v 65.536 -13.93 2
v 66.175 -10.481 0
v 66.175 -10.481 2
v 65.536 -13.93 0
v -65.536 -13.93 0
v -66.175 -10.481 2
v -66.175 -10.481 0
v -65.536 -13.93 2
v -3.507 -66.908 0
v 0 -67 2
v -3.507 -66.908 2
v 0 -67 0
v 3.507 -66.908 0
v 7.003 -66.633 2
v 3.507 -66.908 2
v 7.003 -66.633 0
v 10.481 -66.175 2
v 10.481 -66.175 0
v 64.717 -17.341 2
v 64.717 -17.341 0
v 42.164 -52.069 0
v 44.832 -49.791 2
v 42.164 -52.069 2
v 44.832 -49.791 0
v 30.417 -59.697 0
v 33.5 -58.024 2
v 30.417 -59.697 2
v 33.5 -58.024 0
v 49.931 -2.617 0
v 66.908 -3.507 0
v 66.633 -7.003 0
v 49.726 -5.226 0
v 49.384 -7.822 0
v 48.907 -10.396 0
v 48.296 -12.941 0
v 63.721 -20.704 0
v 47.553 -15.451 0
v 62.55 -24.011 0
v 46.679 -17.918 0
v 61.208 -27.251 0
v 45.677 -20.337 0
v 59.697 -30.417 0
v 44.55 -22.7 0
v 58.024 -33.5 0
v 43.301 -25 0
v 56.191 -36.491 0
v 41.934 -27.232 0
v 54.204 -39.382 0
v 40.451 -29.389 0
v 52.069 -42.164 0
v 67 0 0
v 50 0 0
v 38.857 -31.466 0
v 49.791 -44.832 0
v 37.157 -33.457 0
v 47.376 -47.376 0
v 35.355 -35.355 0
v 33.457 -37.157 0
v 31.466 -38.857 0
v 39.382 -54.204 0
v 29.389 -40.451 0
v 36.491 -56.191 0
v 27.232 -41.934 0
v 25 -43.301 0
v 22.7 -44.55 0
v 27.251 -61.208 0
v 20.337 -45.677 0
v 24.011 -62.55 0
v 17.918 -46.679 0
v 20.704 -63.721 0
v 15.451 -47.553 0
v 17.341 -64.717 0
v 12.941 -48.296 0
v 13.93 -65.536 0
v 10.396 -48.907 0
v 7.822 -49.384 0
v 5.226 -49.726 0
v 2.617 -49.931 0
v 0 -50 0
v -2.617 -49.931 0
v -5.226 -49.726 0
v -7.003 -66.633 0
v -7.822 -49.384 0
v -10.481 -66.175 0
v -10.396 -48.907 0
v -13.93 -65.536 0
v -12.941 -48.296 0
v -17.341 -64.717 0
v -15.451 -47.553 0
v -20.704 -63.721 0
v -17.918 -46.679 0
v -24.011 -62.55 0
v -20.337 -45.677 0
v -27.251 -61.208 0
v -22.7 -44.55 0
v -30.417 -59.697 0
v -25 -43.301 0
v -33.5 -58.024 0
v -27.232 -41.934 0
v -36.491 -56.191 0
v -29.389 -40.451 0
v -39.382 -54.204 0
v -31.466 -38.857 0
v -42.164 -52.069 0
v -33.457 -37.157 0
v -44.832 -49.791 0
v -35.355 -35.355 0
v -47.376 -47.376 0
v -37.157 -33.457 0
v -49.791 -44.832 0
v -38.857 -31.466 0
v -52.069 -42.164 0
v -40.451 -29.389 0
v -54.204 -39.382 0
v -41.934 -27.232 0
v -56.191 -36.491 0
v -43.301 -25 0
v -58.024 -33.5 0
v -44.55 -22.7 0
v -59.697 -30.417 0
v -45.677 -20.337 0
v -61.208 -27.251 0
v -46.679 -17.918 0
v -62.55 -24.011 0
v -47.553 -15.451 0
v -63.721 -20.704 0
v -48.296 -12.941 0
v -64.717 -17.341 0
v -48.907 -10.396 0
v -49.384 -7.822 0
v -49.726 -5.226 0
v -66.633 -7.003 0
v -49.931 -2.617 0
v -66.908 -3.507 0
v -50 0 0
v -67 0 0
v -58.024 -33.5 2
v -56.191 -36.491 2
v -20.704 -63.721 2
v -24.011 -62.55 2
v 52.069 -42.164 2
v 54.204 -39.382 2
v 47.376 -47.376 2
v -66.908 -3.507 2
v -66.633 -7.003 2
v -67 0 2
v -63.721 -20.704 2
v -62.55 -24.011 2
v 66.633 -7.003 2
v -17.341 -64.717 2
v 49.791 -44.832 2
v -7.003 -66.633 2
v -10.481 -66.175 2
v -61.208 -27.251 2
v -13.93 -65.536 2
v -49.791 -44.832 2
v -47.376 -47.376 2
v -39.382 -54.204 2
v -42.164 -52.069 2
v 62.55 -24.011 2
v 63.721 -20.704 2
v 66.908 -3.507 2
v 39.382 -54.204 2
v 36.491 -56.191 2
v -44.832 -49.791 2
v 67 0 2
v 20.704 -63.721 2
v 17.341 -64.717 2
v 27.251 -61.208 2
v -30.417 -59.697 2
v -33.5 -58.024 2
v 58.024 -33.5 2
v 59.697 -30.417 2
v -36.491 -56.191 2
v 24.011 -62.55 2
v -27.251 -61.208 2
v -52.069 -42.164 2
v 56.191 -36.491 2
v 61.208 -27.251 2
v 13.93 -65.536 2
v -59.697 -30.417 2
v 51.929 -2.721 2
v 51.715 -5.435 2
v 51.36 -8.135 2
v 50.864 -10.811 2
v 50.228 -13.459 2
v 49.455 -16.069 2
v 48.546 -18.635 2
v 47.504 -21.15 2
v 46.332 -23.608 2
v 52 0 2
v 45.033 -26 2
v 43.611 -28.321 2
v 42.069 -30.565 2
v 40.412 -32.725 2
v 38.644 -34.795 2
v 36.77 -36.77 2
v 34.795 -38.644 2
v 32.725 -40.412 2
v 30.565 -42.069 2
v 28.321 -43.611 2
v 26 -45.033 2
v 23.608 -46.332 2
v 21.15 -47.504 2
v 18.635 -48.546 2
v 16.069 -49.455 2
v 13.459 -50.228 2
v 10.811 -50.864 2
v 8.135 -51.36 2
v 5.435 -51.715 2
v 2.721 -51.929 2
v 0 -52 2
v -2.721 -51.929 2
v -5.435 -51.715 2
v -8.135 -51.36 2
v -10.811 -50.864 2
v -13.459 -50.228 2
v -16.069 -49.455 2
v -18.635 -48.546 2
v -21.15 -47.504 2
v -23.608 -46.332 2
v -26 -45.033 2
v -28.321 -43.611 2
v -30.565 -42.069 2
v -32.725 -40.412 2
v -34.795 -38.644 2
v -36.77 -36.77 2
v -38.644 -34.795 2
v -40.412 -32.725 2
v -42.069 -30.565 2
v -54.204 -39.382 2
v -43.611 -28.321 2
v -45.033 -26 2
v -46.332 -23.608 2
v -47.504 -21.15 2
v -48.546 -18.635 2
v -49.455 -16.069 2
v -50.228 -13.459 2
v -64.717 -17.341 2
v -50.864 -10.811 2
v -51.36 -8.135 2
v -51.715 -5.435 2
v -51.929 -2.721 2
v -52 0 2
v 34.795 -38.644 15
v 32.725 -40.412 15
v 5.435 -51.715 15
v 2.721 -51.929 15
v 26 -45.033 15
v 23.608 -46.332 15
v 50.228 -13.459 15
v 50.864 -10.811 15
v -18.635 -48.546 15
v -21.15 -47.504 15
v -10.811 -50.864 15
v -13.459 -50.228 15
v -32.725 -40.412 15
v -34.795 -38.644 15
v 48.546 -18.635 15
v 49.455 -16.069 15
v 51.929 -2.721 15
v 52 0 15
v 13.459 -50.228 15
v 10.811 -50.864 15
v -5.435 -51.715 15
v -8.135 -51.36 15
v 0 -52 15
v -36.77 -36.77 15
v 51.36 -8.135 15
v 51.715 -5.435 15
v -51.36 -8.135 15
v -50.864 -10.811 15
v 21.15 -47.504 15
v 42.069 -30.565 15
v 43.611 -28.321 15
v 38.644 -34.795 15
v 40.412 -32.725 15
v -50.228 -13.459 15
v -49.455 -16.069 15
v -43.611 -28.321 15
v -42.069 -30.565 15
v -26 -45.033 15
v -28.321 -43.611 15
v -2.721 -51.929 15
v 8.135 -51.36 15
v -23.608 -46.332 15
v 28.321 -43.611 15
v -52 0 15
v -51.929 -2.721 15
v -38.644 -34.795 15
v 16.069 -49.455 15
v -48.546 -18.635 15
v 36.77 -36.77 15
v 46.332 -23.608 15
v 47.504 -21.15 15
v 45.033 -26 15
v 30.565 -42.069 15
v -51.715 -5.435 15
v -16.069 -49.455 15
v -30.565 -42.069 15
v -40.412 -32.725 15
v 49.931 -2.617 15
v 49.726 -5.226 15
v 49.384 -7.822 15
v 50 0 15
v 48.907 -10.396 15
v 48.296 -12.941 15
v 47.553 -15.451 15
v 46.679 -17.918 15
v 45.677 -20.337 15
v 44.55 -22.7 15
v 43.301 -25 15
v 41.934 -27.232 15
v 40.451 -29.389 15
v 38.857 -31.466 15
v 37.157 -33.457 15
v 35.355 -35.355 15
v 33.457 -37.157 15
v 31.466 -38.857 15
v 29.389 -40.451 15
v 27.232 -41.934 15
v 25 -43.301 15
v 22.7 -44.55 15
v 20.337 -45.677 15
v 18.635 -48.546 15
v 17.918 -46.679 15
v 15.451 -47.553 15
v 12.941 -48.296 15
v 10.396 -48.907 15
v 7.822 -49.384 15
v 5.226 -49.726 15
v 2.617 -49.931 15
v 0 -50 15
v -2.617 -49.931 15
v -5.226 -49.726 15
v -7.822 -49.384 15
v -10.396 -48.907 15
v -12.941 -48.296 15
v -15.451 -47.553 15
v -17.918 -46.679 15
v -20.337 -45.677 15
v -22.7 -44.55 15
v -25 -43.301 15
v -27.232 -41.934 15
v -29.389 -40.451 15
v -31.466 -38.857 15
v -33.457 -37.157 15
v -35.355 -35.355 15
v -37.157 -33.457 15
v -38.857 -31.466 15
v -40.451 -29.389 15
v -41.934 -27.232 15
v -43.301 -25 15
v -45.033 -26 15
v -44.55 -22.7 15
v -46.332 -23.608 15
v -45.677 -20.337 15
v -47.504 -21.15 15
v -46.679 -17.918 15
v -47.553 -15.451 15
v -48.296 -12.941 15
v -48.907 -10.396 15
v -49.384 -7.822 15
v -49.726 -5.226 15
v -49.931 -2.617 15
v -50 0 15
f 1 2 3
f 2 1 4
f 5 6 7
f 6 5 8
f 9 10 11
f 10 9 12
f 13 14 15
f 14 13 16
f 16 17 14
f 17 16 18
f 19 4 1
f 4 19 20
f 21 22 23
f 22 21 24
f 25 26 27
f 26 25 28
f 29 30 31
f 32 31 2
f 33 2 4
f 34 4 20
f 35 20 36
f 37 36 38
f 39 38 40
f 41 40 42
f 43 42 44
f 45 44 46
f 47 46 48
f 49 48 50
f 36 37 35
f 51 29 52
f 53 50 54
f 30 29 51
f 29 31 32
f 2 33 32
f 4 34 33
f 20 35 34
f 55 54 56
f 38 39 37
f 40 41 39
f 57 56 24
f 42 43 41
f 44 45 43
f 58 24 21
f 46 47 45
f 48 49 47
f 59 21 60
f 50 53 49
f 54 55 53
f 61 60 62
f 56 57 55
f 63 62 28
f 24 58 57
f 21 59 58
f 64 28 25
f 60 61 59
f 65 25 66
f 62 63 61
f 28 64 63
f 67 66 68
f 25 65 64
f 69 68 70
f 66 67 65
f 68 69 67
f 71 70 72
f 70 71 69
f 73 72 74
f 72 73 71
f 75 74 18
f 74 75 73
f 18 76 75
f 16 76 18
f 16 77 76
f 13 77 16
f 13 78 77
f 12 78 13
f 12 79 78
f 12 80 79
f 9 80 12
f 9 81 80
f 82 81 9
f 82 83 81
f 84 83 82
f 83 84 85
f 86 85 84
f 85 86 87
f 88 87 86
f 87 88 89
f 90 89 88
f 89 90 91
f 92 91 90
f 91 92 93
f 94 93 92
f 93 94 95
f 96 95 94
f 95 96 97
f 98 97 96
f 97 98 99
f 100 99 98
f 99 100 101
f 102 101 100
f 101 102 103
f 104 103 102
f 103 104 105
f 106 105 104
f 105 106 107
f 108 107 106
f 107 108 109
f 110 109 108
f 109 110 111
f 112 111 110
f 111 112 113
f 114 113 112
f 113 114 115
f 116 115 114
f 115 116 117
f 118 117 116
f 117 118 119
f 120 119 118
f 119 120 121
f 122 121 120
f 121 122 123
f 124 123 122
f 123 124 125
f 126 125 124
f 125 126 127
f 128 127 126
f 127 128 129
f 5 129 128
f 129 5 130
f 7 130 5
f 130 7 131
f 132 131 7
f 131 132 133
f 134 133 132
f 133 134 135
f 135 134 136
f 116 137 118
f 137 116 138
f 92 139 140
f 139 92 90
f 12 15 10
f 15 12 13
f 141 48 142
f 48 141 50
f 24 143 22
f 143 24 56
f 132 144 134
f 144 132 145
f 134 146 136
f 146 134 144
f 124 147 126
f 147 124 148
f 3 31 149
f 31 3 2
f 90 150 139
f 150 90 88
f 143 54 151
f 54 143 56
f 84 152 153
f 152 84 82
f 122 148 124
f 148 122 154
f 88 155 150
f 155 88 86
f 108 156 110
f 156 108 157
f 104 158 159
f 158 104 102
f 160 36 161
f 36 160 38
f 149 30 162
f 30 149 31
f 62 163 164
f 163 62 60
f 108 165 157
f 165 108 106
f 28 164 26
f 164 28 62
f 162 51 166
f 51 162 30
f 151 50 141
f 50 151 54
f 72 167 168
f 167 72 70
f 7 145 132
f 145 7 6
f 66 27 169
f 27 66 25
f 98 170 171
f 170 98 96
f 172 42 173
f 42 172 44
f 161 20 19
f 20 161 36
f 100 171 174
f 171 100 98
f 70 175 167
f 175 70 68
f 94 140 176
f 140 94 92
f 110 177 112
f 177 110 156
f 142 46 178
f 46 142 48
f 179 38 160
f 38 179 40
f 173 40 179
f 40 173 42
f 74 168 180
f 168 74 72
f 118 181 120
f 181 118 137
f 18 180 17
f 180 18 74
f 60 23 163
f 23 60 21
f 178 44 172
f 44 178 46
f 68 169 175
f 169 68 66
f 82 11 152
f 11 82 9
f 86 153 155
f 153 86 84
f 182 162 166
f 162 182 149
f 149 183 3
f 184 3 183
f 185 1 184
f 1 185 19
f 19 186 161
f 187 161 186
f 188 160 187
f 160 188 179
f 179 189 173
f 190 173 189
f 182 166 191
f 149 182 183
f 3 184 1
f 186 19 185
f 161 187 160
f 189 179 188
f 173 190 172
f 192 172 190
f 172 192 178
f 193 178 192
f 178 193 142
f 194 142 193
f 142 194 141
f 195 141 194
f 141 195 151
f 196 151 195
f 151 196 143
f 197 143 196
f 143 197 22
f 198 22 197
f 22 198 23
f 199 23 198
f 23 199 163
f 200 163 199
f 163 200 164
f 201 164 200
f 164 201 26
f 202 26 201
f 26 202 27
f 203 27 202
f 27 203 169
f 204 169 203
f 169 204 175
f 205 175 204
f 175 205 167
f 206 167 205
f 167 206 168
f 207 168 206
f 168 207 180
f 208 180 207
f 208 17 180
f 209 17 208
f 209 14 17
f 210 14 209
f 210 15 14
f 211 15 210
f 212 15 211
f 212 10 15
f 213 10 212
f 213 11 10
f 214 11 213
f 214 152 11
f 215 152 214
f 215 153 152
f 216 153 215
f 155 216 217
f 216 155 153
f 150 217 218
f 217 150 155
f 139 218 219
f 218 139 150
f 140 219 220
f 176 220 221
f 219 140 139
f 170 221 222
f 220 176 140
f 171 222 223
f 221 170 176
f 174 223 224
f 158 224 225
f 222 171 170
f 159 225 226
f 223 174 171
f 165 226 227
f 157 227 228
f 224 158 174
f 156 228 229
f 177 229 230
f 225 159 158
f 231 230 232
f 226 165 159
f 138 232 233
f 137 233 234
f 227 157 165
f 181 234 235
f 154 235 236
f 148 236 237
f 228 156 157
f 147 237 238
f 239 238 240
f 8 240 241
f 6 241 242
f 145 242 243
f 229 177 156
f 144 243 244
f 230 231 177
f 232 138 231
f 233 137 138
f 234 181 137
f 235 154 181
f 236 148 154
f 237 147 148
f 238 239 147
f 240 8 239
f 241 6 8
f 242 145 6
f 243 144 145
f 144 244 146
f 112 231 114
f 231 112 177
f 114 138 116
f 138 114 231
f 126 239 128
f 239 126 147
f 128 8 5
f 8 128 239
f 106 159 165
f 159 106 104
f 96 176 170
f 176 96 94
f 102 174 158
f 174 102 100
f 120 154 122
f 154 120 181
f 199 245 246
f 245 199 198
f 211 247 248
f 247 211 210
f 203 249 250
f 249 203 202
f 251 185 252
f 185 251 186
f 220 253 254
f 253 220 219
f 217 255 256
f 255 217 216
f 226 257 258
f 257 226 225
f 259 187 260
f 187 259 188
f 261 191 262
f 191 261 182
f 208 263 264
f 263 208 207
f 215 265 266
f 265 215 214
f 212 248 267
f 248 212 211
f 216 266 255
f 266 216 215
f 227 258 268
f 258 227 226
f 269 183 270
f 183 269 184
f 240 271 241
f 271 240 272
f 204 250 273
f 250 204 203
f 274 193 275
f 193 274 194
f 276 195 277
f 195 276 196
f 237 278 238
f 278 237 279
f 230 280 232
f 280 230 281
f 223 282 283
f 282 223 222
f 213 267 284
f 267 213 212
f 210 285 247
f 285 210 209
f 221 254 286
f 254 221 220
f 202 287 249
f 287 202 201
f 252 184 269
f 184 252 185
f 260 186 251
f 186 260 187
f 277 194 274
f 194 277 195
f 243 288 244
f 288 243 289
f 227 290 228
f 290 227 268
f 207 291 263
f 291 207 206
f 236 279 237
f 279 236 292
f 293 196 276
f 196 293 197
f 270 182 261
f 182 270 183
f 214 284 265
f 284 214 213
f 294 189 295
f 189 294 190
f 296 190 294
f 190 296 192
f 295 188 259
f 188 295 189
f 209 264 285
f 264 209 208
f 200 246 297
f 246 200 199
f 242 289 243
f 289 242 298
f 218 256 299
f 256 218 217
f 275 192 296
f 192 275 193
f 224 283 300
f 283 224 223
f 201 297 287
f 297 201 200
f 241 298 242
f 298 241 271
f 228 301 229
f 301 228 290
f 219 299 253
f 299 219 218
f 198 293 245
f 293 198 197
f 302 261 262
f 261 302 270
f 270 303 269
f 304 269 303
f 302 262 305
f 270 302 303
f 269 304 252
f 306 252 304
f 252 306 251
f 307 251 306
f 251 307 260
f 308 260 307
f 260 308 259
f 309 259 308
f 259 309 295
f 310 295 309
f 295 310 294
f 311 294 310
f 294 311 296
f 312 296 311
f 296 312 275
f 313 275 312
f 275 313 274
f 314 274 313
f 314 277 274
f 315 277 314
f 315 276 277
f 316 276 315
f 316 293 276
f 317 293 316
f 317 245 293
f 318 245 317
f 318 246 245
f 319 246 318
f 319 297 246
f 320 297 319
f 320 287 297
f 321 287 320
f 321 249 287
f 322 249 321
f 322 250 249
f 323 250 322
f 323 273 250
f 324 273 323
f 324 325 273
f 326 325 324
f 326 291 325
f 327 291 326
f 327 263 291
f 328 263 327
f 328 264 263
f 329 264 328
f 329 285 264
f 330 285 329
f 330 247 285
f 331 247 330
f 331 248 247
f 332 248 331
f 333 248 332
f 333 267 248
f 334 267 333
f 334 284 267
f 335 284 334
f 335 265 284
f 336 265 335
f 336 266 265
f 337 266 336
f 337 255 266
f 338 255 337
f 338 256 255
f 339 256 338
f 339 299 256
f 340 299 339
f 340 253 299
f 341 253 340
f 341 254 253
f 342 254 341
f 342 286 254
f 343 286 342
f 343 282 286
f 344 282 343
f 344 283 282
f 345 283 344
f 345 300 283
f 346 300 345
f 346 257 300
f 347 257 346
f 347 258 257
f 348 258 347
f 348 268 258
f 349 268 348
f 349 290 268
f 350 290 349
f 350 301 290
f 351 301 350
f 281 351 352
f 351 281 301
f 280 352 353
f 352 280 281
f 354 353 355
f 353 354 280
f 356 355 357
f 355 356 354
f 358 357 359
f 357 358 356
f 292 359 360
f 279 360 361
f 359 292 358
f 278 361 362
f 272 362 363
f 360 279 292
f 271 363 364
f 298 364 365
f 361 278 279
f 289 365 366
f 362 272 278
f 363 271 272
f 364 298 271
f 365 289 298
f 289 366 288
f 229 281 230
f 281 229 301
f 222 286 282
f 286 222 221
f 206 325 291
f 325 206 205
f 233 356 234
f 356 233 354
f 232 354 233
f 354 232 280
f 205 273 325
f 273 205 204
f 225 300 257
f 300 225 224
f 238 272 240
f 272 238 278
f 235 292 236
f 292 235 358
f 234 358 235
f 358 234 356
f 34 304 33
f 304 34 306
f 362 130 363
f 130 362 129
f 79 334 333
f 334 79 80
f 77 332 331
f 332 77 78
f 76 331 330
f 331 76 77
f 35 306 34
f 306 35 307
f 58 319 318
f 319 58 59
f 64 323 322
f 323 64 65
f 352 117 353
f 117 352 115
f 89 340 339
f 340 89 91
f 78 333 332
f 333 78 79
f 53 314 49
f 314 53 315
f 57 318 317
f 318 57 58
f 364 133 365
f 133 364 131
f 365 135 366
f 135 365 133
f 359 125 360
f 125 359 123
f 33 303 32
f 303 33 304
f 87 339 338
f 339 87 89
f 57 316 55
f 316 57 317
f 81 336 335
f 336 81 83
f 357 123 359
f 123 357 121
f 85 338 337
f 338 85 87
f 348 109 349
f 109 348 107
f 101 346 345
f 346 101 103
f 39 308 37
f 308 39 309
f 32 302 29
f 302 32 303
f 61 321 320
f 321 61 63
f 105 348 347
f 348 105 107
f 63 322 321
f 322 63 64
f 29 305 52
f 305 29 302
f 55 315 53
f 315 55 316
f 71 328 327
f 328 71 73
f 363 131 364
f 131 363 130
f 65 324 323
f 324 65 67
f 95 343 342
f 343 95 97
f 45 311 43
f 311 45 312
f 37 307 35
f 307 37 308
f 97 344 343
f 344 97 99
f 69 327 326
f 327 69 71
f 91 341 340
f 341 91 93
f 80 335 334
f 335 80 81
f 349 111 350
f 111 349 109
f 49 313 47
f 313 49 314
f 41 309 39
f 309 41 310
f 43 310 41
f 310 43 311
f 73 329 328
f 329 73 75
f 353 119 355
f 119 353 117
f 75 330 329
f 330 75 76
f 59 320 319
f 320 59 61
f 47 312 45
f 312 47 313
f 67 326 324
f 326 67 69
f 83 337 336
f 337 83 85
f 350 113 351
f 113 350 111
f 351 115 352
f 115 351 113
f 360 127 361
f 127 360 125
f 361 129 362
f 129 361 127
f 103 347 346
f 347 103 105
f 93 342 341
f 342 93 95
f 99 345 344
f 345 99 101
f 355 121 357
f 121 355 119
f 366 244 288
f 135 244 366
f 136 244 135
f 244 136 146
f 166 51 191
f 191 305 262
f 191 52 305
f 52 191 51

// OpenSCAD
// [FL_INDEX: keywords="openscad, 3d_parametric, Decorative_Flange, csg_solid" | COT="Parametric OpenSCAD design from 3DCodeverse"]
// Title: Decorative Flange

// general size flange 
// July 5, 2013
// R Lazure

Inside_Diameter=100;//[10:200]
Flange_Lip=15;//[5,10,15,20,25,30]
Edge_Height=15;//[5,10,15,20,25,30]
$fa=2+1;
thickness=1.95+.05;
OD= Inside_Diameter+2*Flange_Lip+2*thickness;
ODrad= OD/2;
IDrad= Inside_Diameter/2;
innerrad= IDrad+thickness;

intersection(){
	translate([-ODrad-15,-OD-30,0]) cube(OD+30,OD+30,OD+30);
 difference() {
   union(){
     cylinder(thickness, ODrad, ODrad);
    cylinder(Edge_Height, innerrad, innerrad);
          }
   translate([0,0,-10]) cylinder(Edge_Height+20,Inside_Diameter/2,Inside_Diameter/2);
             }
		}

 
